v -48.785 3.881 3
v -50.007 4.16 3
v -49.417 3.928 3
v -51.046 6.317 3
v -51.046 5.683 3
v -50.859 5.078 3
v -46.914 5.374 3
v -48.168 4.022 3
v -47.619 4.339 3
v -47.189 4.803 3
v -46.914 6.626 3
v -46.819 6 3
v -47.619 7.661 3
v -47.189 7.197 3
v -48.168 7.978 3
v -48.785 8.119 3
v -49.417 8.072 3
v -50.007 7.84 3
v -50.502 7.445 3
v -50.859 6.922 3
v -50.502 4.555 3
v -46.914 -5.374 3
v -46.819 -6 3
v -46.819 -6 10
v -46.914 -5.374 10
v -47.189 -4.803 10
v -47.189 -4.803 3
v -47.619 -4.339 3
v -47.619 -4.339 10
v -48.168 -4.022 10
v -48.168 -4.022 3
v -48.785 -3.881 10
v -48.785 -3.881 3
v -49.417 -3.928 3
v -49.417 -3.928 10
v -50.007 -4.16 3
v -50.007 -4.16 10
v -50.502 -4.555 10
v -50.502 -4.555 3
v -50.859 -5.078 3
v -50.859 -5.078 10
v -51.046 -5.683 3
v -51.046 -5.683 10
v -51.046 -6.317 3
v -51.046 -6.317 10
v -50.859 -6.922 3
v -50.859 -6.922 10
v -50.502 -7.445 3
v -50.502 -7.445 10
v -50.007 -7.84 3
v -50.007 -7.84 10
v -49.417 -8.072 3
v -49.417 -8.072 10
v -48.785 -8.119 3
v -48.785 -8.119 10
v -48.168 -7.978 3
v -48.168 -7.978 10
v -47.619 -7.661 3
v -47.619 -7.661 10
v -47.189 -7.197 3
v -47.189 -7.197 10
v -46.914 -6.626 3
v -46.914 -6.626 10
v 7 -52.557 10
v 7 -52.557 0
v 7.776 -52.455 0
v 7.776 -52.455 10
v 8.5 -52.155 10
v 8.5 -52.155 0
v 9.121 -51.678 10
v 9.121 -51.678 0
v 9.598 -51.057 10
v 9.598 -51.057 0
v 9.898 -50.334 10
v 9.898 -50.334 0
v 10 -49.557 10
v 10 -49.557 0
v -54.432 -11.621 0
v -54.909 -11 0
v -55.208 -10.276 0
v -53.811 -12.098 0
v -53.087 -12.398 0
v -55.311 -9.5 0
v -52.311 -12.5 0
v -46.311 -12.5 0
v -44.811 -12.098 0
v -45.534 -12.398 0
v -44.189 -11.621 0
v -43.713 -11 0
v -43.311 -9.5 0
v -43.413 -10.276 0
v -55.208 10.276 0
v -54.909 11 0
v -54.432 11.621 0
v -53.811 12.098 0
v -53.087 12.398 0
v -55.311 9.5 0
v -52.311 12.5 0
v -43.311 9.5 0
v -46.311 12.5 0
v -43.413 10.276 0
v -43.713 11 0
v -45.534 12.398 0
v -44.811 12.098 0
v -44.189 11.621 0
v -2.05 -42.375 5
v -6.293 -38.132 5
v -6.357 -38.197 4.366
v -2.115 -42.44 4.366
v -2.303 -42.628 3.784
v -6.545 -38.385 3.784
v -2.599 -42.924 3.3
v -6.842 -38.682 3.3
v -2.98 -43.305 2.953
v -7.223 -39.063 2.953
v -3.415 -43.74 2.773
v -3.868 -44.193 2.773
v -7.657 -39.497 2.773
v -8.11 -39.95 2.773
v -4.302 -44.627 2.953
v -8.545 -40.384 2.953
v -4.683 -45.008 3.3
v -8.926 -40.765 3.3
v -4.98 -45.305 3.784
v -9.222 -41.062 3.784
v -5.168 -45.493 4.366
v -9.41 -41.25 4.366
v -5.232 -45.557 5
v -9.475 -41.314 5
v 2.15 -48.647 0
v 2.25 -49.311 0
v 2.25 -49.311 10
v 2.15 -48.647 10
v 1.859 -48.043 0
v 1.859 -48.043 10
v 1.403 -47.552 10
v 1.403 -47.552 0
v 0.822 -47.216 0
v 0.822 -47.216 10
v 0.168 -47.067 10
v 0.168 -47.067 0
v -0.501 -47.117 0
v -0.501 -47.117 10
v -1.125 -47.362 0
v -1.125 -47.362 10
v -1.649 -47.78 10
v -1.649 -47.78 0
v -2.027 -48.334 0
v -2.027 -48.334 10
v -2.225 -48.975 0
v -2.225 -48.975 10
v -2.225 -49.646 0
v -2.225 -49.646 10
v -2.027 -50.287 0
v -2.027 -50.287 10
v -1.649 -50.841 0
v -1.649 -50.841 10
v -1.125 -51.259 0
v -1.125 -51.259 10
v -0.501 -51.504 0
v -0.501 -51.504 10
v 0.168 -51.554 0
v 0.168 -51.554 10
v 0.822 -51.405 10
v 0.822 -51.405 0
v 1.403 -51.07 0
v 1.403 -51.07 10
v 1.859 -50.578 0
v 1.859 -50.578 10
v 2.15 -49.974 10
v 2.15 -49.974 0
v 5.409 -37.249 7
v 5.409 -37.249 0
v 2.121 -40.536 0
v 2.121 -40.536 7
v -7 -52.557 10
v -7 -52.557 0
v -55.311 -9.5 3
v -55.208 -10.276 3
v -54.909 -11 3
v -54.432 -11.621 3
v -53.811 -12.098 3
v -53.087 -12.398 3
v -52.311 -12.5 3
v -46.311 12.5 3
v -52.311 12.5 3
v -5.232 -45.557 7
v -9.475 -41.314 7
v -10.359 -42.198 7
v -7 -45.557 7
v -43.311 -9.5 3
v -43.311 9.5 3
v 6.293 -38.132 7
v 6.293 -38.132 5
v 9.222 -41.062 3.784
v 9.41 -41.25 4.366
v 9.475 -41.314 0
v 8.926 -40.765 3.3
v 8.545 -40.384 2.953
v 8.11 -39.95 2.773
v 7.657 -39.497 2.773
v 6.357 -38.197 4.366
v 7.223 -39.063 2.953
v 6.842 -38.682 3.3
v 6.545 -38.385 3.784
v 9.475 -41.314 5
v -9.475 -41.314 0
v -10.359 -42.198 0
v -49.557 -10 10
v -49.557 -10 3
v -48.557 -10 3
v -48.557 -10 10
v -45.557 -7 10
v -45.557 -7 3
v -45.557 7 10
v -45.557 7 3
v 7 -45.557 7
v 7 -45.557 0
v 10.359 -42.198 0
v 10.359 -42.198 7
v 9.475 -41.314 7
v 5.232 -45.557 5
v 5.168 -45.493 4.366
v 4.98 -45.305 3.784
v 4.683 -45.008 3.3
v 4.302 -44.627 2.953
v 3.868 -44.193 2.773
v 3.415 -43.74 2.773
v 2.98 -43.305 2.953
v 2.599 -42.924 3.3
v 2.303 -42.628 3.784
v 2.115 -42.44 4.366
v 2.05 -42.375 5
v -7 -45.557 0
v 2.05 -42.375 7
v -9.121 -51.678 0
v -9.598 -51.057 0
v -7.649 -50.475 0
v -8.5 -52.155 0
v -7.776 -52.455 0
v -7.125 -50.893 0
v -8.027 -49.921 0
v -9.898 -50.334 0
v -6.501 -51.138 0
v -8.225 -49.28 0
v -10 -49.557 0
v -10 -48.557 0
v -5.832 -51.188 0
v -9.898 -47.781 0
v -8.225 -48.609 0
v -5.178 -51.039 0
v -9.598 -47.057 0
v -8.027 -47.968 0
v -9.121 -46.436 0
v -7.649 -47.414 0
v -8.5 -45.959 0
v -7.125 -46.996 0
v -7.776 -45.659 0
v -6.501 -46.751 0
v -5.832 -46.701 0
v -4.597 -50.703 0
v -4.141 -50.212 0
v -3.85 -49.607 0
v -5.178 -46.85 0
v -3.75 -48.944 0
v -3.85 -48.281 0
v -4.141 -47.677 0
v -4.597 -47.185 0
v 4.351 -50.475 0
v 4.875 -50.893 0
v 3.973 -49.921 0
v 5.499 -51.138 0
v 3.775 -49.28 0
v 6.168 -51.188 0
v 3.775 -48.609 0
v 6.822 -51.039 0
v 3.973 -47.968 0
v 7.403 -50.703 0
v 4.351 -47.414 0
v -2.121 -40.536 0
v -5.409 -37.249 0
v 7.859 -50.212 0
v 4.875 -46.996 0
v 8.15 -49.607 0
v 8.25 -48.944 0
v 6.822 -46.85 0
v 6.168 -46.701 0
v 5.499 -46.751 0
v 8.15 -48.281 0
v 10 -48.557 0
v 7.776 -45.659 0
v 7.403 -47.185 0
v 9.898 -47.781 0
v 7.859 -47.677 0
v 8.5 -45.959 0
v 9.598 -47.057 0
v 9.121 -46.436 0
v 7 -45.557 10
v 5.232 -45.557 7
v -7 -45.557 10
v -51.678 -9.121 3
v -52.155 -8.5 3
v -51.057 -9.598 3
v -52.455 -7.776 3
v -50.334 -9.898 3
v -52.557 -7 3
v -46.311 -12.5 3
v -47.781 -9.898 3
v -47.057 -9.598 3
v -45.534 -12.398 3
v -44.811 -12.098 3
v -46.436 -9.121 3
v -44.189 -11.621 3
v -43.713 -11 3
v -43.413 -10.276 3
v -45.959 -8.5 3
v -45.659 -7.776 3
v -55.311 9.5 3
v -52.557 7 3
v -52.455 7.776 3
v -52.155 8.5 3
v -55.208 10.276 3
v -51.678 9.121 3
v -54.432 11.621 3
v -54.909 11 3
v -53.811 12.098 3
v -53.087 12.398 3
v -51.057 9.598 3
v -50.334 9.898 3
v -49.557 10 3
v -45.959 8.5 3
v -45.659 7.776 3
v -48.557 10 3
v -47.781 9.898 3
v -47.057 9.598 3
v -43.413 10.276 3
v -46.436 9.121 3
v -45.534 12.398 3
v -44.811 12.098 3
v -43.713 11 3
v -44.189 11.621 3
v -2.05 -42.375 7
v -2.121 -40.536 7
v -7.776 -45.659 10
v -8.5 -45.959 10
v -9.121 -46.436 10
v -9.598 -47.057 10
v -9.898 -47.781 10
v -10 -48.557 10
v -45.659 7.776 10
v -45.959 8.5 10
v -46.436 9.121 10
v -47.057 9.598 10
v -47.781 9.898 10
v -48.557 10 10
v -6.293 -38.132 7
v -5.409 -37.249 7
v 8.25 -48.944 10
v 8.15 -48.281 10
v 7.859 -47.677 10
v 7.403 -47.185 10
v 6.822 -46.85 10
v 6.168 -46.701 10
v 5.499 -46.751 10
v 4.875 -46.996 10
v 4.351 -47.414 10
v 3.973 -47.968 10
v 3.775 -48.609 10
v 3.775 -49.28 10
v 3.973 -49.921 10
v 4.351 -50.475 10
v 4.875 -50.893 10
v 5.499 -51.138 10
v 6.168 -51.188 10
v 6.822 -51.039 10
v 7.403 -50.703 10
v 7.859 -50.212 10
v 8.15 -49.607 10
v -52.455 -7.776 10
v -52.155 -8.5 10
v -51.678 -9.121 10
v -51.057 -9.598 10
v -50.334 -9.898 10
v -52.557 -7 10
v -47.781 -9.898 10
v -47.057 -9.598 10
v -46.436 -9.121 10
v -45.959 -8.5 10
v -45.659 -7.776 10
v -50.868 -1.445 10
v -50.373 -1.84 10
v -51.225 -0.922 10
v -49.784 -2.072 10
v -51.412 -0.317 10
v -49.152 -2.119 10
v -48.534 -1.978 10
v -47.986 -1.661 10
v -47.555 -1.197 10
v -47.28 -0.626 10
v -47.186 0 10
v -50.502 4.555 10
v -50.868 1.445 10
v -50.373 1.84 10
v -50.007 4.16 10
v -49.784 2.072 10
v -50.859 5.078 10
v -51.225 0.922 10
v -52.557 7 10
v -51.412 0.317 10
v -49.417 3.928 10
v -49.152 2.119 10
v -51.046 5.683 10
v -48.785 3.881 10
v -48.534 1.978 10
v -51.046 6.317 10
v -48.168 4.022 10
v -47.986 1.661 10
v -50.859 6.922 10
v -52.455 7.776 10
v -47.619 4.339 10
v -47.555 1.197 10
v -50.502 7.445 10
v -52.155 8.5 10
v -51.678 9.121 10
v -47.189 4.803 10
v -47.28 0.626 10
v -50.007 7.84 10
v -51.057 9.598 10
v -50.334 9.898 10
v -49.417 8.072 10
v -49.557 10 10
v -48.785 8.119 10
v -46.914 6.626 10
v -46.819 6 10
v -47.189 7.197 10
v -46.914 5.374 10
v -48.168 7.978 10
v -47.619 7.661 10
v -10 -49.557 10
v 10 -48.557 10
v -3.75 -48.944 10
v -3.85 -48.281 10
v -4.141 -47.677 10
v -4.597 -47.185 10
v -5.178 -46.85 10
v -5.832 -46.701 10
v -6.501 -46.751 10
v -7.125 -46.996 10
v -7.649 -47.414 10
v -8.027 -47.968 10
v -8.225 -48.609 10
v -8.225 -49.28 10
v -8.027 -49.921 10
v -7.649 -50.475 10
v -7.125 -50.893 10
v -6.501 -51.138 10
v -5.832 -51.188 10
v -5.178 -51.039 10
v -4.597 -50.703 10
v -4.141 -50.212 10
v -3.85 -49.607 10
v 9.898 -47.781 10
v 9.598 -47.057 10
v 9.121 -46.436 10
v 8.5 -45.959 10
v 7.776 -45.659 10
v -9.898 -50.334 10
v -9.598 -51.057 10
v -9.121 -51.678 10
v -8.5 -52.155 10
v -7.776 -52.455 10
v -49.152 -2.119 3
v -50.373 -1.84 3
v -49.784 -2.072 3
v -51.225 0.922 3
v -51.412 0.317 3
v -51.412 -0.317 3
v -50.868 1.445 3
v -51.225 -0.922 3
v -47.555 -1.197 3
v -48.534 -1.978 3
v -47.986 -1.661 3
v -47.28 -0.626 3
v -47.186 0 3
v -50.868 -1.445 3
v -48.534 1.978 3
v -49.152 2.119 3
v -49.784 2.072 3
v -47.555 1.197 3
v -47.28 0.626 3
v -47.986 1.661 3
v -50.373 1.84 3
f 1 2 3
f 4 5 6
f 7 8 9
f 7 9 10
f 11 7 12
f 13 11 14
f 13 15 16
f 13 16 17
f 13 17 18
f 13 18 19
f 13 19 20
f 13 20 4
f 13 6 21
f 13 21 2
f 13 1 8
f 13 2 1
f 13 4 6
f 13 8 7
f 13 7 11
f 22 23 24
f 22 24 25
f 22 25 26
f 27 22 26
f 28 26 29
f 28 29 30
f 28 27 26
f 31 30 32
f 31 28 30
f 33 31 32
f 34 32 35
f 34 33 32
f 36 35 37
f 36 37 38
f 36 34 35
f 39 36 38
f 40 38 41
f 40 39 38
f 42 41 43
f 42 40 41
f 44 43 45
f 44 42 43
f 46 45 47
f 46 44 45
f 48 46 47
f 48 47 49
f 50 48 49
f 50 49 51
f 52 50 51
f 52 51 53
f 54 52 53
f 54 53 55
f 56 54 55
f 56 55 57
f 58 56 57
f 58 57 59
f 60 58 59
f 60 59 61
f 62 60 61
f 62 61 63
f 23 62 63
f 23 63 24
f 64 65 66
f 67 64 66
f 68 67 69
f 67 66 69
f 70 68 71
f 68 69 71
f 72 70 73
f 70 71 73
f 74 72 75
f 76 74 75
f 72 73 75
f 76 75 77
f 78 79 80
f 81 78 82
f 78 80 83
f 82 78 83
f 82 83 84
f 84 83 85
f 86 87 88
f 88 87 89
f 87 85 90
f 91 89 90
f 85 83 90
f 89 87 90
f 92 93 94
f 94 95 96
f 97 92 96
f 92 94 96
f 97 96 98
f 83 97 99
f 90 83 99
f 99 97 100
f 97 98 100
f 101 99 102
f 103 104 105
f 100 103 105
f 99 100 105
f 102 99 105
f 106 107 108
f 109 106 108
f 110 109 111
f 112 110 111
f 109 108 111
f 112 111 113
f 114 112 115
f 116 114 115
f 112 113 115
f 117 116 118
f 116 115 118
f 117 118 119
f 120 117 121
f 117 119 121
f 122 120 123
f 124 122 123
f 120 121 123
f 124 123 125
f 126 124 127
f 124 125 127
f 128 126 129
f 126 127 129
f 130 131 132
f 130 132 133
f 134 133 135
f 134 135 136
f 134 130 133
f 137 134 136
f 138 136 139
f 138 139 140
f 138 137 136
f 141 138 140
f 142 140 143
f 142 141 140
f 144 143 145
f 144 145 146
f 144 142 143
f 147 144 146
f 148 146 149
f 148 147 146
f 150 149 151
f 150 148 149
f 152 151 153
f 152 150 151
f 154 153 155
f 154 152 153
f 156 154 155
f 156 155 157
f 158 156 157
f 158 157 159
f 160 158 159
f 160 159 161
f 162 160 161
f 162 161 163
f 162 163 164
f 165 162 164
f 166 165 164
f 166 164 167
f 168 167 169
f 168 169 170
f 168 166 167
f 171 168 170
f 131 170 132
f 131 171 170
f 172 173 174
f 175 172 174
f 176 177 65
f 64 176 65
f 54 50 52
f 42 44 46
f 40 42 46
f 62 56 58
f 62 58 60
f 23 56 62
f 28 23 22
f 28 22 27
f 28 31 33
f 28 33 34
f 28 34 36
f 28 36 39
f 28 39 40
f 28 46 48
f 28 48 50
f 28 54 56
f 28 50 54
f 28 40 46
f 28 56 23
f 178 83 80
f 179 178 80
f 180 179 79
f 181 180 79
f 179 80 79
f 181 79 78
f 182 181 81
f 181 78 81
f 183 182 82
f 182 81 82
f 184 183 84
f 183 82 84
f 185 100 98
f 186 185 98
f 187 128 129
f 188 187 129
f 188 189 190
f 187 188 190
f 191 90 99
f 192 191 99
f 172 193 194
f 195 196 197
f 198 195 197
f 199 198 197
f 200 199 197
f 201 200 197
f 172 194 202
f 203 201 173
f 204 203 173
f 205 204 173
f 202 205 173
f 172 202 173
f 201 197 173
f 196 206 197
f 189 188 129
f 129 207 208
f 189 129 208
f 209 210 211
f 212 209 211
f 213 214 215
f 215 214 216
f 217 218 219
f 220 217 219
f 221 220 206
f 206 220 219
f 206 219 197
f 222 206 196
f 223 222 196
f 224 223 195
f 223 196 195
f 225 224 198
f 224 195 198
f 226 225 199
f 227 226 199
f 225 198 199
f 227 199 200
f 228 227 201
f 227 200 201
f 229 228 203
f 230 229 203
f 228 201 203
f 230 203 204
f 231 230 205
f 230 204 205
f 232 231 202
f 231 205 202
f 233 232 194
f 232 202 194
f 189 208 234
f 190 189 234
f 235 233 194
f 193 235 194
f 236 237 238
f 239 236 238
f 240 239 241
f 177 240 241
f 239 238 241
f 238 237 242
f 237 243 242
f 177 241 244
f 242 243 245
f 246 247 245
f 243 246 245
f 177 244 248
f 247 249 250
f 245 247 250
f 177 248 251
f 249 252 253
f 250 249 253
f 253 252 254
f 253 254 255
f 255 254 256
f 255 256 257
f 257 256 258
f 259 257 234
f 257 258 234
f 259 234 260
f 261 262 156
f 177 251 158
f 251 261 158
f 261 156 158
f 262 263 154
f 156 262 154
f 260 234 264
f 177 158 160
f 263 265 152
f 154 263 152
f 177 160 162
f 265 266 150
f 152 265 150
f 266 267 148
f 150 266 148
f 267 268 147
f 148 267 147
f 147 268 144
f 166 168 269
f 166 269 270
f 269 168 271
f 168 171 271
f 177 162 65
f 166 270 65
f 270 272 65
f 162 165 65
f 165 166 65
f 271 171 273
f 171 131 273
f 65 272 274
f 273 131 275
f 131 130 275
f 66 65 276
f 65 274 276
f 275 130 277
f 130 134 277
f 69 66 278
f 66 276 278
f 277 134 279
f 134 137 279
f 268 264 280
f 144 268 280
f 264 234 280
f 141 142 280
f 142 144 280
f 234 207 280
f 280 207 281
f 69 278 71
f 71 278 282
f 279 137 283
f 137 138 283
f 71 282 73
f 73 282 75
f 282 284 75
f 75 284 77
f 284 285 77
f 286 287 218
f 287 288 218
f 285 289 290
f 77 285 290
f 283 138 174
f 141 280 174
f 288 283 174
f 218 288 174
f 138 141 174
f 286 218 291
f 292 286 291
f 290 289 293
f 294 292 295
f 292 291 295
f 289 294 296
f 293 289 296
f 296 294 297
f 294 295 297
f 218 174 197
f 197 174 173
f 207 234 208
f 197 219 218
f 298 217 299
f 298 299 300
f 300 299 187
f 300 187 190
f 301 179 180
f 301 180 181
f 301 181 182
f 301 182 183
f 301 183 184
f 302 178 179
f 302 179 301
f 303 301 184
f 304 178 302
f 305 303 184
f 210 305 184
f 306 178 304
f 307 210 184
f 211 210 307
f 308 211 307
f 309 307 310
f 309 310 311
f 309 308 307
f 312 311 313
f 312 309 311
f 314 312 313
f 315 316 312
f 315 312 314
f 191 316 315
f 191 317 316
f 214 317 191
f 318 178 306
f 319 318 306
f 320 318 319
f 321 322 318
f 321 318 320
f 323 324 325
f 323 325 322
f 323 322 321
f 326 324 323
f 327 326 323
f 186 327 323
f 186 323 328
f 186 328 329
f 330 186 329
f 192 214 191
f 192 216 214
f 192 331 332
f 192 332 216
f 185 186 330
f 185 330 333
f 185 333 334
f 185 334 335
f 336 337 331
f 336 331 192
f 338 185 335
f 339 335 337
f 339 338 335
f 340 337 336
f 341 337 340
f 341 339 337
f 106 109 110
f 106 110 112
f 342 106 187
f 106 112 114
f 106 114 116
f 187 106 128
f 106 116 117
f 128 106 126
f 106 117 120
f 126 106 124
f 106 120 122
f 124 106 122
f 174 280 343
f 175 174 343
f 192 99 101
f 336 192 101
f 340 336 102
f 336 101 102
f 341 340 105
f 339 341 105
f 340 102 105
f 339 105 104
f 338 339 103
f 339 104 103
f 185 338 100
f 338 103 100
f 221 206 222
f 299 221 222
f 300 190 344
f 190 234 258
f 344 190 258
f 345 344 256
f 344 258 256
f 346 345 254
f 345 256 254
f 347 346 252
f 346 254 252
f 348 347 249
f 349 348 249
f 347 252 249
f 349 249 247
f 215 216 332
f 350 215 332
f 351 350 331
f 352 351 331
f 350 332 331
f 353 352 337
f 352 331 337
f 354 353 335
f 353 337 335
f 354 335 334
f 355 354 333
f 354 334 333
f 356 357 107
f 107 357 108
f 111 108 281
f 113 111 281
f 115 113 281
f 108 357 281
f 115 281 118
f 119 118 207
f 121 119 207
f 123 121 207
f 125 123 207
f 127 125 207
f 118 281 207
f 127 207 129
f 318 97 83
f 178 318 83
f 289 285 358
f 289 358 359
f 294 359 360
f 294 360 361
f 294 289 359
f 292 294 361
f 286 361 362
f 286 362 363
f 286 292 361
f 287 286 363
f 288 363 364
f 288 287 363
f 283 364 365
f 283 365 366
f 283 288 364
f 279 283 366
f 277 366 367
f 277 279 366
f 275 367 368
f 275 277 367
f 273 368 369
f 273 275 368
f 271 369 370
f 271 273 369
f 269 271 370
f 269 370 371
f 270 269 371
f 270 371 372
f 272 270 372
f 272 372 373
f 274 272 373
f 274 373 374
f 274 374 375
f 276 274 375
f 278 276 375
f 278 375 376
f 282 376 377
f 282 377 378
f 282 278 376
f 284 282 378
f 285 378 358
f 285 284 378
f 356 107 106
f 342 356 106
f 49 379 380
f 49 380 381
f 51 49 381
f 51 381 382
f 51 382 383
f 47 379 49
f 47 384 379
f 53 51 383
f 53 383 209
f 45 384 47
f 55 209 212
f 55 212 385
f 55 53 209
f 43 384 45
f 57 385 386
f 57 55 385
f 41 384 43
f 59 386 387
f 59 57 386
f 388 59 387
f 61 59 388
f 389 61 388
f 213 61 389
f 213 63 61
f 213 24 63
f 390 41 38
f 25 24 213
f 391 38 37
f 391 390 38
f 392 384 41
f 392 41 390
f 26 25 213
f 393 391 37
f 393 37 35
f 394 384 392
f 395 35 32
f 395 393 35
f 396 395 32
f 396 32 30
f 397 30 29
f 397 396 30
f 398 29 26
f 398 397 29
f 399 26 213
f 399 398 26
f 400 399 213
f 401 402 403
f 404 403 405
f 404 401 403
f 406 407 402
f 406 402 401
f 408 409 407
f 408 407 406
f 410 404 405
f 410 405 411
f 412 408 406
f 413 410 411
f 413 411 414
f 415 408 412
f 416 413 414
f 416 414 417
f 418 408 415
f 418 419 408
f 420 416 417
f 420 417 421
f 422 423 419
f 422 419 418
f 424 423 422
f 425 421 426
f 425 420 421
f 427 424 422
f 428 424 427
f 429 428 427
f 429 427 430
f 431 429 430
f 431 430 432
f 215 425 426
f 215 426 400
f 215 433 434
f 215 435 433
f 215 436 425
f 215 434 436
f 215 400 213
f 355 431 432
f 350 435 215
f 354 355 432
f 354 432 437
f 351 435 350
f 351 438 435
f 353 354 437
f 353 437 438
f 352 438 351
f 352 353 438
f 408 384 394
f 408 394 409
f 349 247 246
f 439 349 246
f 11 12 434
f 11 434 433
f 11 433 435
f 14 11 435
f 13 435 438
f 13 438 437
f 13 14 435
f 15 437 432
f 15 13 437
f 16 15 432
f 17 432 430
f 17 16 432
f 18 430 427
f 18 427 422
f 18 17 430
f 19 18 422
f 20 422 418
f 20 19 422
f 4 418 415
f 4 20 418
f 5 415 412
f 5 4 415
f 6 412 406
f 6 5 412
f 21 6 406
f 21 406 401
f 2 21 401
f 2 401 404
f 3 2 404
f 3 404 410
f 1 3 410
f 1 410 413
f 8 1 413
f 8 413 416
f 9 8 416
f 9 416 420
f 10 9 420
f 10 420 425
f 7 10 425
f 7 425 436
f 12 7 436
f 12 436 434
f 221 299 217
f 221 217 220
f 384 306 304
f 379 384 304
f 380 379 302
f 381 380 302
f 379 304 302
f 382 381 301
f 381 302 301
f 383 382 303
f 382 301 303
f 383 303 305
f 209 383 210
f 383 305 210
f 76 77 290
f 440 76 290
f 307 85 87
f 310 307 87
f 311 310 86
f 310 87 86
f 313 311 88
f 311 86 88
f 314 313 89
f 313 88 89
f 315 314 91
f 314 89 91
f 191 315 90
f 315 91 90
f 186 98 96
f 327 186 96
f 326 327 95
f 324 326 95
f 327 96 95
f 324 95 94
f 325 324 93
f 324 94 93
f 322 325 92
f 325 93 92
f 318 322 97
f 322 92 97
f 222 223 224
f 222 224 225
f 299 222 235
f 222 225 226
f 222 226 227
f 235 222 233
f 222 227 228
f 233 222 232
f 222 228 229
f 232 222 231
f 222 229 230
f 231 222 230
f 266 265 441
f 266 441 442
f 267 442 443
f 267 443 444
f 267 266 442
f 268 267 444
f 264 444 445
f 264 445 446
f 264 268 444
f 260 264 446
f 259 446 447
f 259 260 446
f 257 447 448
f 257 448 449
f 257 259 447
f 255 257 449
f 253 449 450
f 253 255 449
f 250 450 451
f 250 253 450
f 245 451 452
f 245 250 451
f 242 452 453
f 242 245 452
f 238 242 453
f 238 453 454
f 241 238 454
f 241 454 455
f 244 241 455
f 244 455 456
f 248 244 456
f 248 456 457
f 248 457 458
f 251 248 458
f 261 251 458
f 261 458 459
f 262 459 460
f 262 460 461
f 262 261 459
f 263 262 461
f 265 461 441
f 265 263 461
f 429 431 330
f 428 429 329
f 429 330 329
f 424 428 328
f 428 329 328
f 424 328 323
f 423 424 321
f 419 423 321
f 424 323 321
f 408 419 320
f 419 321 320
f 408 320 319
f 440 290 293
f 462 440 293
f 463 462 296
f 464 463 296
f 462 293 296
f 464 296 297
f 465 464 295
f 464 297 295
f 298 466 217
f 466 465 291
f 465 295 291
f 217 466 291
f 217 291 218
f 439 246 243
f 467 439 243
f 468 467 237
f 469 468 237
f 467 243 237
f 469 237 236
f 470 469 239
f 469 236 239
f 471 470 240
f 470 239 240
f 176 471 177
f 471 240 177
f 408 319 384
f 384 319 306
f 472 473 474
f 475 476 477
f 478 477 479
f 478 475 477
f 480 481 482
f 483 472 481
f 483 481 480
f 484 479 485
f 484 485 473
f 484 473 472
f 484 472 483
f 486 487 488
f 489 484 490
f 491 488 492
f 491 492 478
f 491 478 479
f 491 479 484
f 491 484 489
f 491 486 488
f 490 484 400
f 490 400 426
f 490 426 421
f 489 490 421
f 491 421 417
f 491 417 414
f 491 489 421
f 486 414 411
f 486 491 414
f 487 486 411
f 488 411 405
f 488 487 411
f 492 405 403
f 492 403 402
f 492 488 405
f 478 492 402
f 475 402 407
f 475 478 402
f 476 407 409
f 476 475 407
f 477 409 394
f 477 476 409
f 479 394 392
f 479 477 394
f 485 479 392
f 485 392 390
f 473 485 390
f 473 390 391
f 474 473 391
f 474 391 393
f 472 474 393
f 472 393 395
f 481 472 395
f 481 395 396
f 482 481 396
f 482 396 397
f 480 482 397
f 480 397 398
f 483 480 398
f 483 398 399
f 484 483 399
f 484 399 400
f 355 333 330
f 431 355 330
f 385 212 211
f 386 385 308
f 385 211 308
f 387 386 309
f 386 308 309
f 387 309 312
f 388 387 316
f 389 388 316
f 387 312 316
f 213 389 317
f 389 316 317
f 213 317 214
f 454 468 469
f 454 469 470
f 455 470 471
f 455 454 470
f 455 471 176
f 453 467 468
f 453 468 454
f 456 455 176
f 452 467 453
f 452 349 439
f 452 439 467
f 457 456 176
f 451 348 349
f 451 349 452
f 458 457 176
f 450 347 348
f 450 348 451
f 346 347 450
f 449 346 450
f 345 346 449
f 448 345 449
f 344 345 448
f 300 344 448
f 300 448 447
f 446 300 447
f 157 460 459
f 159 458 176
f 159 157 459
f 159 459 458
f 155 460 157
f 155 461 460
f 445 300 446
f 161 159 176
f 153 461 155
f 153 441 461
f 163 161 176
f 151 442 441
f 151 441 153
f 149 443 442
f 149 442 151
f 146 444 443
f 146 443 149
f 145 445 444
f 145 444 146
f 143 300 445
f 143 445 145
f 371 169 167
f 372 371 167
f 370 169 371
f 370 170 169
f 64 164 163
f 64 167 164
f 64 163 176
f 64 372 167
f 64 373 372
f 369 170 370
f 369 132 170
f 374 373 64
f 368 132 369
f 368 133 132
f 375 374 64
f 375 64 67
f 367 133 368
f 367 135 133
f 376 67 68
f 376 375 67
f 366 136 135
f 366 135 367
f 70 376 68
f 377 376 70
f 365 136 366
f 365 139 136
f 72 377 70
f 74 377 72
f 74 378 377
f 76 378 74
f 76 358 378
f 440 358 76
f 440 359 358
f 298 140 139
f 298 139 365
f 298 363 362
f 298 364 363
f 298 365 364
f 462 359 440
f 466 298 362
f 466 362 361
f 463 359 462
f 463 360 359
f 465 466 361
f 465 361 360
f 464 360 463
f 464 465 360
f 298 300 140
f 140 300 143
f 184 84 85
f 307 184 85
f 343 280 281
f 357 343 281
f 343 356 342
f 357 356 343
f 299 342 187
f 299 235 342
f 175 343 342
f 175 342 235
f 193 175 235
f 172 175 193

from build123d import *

# Parameters (mm, degrees)
F0_R      = 2.125
F1_DEPTH  = 10
F2_DEPTH  = 3
F0_R_2    = 2.25
F3_DEPTH  = 10
F4_DEPTH  = 7
F5_DEPTH  = 5
F8_DEPTH  = 6
F10_DEPTH = 6
F11_SIZE  = 3


with BuildPart() as f1:
    # F0 (on Top) → F1 (new body)
    with BuildSketch(Plane.XY):
        with BuildLine():
            Line((-49.5571117928, -10), (-48.5571117928, -10))
            ThreePointArc((-48.5571117928, -10), (-46.4357914492, -9.1213203436), (-45.5571117928, -7))
            Line((-45.5571117928, -7), (-45.5571117928, 7))
            ThreePointArc((-45.5571117928, 7), (-46.4357914492, 9.1213203436), (-48.5571117928, 10))
            Line((-48.5571117928, 10), (-49.5571117928, 10))
            ThreePointArc((-49.5571117928, 10), (-51.6784321364, 9.1213203436), (-52.5571117928, 7))
            Line((-52.5571117928, 7), (-52.5571117928, -7))
            ThreePointArc((-52.5571117928, -7), (-51.6784321364, -9.1213203436), (-49.5571117928, -10))
        make_face()
        with Locations((-48.9442686478, -6)):
            Circle(F0_R, mode=Mode.SUBTRACT)
        with Locations((-49.3106624724, 0)):
            Circle(F0_R, mode=Mode.SUBTRACT)
        with Locations((-48.9442686478, 6)):
            Circle(F0_R, mode=Mode.SUBTRACT)
    extrude(amount=F1_DEPTH)

    # F0 (on Top) → F2 (join)
    with BuildSketch(Plane.XY):
        with BuildLine():
            Line((-46.3106624724, 12.5), (-52.3106624724, 12.5))
            ThreePointArc((-52.3106624724, 12.5), (-54.4319828159, 11.6213203436), (-55.3106624724, 9.5))
            Line((-55.3106624724, 9.5), (-55.3106624724, -9.5))
            ThreePointArc((-55.3106624724, -9.5), (-54.4319828159, -11.6213203436), (-52.3106624724, -12.5))
            Line((-52.3106624724, -12.5), (-46.3106624724, -12.5))
            ThreePointArc((-46.3106624724, -12.5), (-44.1893421288, -11.6213203436), (-43.3106624724, -9.5))
            Line((-43.3106624724, -9.5), (-43.3106624724, 9.5))
            ThreePointArc((-43.3106624724, 9.5), (-44.1893421288, 11.6213203436), (-46.3106624724, 12.5))
        make_face()
        with BuildLine():
            ThreePointArc((-45.5571117928, -7), (-46.4357914492, -9.1213203436), (-48.5571117928, -10))
            Line((-48.5571117928, -10), (-49.5571117928, -10))
            ThreePointArc((-49.5571117928, -10), (-51.6784321364, -9.1213203436), (-52.5571117928, -7))
            Line((-52.5571117928, -7), (-52.5571117928, 7))
            ThreePointArc((-52.5571117928, 7), (-51.6784321364, 9.1213203436), (-49.5571117928, 10))
            Line((-49.5571117928, 10), (-48.5571117928, 10))
            ThreePointArc((-48.5571117928, 10), (-46.4357914492, 9.1213203436), (-45.5571117928, 7))
            Line((-45.5571117928, 7), (-45.5571117928, -7))
        make_face(mode=Mode.SUBTRACT)
        with Locations((-48.9442686478, 6)):
            Circle(F0_R)
        with Locations((-49.3106624724, 0)):
            Circle(F0_R)
        with Locations((-48.9442686478, -6)):
            Circle(F0_R)
    extrude(amount=F2_DEPTH)


with BuildPart() as f3:
    # F0 (on Top) → F3 (new body)
    with BuildSketch(Plane.XY):
        with BuildLine():
            Line((-5.232233047, -45.5571117928), (-7, -45.5571117928))
            ThreePointArc((-7, -45.5571117928), (-9.1213203436, -46.4357914492), (-10, -48.5571117928))
            Line((-10, -48.5571117928), (-10, -49.5571117928))
            ThreePointArc((-10, -49.5571117928), (-9.1213203436, -51.6784321364), (-7, -52.5571117928))
            Line((-7, -52.5571117928), (7, -52.5571117928))
            ThreePointArc((7, -52.5571117928), (9.1213203436, -51.6784321364), (10, -49.5571117928))
            Line((10, -49.5571117928), (10, -48.5571117928))
            ThreePointArc((10, -48.5571117928), (9.1213203436, -46.4357914492), (7, -45.5571117928))
            Line((7, -45.5571117928), (5.232233047, -45.5571117928))
            Line((5.232233047, -45.5571117928), (-2.8994949366, -45.5571117928))
            Line((-2.8994949366, -45.5571117928), (-5.232233047, -45.5571117928))
        make_face()
        with Locations((-6, -48.9442686478)):
            Circle(F0_R_2, mode=Mode.SUBTRACT)
        with Locations((0, -49.3106624724)):
            Circle(F0_R_2, mode=Mode.SUBTRACT)
        with Locations((6, -48.9442686478)):
            Circle(F0_R_2, mode=Mode.SUBTRACT)
    extrude(amount=F3_DEPTH)


with BuildPart() as f4:
    # F0 (on Top) → F4 (new body)
    with BuildSketch(Plane.XY):
        Polygon((-2.0502525317, -42.3751312775), (-5.232233047, -45.5571117928), (-2.8994949366, -45.5571117928), (5.232233047, -45.5571117928), (2.0502525317, -42.3751312775), (6.2928932188, -38.1324905903), (5.4090097423, -37.2486071138), (0, -42.6576168562), (-5.4090097423, -37.2486071138), (-6.2928932188, -38.1324905903), align=None)
    extrude(amount=F4_DEPTH)


with BuildPart() as f4b:
    # F0 (on Top) → F4, piece 2 (new body)
    with BuildSketch(Plane.XY):
        Polygon((9.4748737342, -41.3144711057), (5.232233047, -45.5571117928), (7, -45.5571117928), (10.3587572106, -42.1983545822), align=None)
    extrude(amount=F4_DEPTH)


with BuildPart() as f4c:
    # F0 (on Top) → F4, piece 3 (new body)
    with BuildSketch(Plane.XY):
        Polygon((-10.3587572106, -42.1983545822), (-7, -45.5571117928), (-5.232233047, -45.5571117928), (-9.4748737342, -41.3144711057), align=None)
    extrude(amount=F4_DEPTH)


with BuildPart() as f5:
    # F0 (on Top) → F5 (new body)
    with BuildSketch(Plane.XY):
        Polygon((-9.4748737342, -41.3144711057), (-5.232233047, -45.5571117928), (-2.0502525317, -42.3751312775), (-6.2928932188, -38.1324905903), align=None)
    extrude(amount=F5_DEPTH)


with BuildPart() as f5b:
    # F0 (on Top) → F5, piece 2 (new body)
    with BuildSketch(Plane.XY):
        Polygon((2.0502525317, -42.3751312775), (5.232233047, -45.5571117928), (9.4748737342, -41.3144711057), (6.2928932188, -38.1324905903), align=None)
    extrude(amount=F5_DEPTH)


with BuildPart() as f3_1:
    add(f3.part)

    # F6: union F5, F4, F4c, F5b, F4b
    add(f5.part)
    add(f4.part)
    add(f4c.part)
    add(f5b.part)
    add(f4b.part)

    # F7 (on face) → F8 (cut, through all)
    with BuildSketch(Plane(origin=(-15.9197986858, -15.9197986858, 0), x_dir=(-0.7071067812, 0.7071067812, 0), z_dir=(0.7071067812, 0.7071067812, 0))):
        with BuildLine():
            Line((-31.4134901483, 5), (-35.9134901483, 5))
            ThreePointArc((-35.9134901483, 5), (-33.6634901483, 2.75), (-31.4134901483, 5))
        make_face()
    extrude(amount=-F8_DEPTH, mode=Mode.SUBTRACT)

    # F9 (on face) → F10 (cut, through all)
    with BuildSketch(Plane(origin=(15.9197986858, -15.9197986858, 0), x_dir=(-0.7071067812, -0.7071067812, 0), z_dir=(-0.7071067812, 0.7071067812, 0))):
        with BuildLine():
            Line((35.9134901483, 5), (31.4134901483, 5))
            ThreePointArc((31.4134901483, 5), (33.6634901483, 2.75), (35.9134901483, 5))
        make_face()
    extrude(amount=-F10_DEPTH, mode=Mode.SUBTRACT)

    # F11
    f11_edges = [f3_1.edges().sort_by_distance(p)[0] for p in [
        (0, -42.657617, 3.5),
    ]]
    chamfer(f11_edges, length=F11_SIZE)


solid = Compound([f1.part, f3_1.part])
